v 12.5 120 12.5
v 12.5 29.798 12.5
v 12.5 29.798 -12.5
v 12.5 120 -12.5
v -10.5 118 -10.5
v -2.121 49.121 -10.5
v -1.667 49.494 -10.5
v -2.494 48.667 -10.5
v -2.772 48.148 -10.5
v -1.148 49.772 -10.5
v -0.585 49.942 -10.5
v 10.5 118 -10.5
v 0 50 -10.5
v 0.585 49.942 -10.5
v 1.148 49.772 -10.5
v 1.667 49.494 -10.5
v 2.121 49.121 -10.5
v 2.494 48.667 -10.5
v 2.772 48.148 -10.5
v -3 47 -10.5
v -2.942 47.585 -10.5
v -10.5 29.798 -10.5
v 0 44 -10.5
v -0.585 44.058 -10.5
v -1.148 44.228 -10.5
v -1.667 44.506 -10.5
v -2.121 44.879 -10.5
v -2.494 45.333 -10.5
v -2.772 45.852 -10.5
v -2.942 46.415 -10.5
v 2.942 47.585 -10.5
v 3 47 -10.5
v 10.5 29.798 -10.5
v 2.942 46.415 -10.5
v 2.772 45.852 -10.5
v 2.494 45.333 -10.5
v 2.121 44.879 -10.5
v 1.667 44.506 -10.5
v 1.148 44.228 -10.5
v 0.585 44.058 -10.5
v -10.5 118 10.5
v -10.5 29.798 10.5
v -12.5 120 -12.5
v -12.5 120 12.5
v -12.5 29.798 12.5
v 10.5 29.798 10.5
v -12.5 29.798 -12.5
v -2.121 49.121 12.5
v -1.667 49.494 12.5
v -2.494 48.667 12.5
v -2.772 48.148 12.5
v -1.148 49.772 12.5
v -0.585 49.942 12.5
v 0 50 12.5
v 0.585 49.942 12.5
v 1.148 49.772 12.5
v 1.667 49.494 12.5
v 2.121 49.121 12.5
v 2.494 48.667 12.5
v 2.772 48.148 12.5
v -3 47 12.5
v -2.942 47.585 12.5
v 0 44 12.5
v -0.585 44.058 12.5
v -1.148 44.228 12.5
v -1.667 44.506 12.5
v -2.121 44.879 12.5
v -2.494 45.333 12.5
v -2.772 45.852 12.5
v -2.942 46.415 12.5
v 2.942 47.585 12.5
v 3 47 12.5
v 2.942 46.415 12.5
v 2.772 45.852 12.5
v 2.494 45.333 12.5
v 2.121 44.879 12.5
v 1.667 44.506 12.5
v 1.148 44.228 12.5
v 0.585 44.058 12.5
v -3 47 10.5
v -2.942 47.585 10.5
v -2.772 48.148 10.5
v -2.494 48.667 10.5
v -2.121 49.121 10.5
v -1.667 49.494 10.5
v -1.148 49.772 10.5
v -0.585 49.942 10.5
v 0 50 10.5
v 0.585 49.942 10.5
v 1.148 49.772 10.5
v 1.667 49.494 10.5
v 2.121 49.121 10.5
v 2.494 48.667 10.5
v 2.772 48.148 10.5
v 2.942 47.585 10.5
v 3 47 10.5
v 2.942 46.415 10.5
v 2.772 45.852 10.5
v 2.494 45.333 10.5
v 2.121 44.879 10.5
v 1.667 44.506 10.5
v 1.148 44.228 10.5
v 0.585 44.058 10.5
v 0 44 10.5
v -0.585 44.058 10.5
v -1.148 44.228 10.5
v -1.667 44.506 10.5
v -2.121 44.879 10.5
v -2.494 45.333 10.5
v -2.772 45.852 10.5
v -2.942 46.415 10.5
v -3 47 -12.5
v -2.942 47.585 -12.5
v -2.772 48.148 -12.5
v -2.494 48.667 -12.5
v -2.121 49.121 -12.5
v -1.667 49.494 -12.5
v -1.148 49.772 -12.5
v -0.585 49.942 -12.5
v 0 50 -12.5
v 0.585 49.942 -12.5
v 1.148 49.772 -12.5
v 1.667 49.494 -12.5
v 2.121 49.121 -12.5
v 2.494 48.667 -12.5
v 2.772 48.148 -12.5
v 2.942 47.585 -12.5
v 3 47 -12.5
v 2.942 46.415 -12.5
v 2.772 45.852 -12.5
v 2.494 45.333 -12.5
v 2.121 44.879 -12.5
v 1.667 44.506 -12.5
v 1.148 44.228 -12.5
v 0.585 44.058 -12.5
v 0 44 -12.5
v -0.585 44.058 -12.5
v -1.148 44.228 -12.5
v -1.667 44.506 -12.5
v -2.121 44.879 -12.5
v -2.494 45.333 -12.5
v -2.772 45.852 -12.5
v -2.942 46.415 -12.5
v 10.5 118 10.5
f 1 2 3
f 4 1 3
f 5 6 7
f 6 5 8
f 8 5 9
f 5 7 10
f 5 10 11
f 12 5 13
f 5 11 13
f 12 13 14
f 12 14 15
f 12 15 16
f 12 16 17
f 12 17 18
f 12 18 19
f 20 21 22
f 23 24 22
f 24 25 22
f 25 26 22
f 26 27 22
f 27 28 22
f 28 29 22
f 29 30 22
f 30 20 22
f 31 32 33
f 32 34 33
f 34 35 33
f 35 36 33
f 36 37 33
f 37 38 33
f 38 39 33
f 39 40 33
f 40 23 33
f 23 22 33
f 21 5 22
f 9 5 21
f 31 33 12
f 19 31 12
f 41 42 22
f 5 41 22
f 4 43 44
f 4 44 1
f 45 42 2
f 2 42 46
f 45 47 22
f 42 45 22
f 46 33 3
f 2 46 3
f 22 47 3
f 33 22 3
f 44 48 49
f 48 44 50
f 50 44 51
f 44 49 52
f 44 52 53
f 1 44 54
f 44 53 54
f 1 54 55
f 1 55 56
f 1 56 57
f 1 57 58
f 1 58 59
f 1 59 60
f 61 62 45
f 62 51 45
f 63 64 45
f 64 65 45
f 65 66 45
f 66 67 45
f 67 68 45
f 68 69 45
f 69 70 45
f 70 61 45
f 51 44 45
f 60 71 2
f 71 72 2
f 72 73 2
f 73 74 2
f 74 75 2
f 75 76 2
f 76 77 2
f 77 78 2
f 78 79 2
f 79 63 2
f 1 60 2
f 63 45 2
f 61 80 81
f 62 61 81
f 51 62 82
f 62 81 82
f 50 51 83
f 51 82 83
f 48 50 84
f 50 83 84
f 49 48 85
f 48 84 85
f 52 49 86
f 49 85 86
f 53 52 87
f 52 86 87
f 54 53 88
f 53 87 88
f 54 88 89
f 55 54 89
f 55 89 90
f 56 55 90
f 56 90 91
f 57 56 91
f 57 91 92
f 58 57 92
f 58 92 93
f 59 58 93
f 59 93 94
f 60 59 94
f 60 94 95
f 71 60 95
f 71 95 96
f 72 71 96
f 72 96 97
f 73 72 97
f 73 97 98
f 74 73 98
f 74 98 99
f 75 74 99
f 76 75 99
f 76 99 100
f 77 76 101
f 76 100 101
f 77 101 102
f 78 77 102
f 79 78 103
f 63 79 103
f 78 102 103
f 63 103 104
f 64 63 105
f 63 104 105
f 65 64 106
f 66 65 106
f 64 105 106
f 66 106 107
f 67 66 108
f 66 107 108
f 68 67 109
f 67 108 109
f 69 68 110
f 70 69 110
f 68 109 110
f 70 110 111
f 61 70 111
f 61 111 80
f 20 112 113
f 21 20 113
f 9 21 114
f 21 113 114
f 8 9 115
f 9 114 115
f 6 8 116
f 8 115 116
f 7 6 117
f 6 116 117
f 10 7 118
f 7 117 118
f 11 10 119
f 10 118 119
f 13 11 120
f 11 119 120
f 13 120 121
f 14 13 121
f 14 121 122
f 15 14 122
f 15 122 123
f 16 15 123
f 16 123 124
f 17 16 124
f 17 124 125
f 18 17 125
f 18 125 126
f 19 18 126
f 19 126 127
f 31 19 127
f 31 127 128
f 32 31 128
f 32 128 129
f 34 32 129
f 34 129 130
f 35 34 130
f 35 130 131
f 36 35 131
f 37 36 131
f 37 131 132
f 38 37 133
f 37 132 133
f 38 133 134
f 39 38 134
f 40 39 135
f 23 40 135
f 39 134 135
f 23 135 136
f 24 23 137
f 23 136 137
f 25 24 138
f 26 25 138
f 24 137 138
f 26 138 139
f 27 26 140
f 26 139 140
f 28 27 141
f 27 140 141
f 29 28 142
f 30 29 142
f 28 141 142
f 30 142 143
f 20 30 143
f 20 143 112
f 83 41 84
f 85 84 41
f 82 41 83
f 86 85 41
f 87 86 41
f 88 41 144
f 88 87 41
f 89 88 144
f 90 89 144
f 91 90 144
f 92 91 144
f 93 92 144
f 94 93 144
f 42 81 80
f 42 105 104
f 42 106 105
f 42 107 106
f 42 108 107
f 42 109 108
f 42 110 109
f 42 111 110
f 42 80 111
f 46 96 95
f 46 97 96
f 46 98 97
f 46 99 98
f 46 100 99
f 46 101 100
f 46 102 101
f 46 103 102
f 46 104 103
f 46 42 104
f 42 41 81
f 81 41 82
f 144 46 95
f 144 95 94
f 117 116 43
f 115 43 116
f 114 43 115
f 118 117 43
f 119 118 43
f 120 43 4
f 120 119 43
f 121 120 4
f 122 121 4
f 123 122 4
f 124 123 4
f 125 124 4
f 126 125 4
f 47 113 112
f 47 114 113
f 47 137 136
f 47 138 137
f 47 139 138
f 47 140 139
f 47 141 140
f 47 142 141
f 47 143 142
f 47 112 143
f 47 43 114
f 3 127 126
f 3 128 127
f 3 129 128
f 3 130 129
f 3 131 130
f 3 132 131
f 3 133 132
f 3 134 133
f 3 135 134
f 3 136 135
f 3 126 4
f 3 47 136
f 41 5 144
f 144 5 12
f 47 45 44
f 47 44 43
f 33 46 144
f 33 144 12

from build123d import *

# Parameters (mm, degrees)
SKETCH1_W                = 25.000000038
SKETCH1_H                = 25.000000038
BOSS_EXTRUDE1_DEPTH      = 120
SHELL1_T                 = -2
F_6_0_6_DIAMETER_HOLE1_D = 6
SKETCH6_W                = 35.234136461
SKETCH6_H                = 40.928418781
CUT_EXTRUDE1_DEPTH       = 48.26
CUT_EXTRUDE2_DEPTH       = 48.26
CUT_EXTRUDE2_DEPTH_BACK  = 48.26
SKETCH6_2_W              = 35.234136461
SKETCH6_2_H              = 40.928418781


with BuildPart() as part:
    # Sketch1 → Boss-Extrude1 (new body)
    with BuildSketch(Plane(origin=(0, 0, 0), x_dir=(1, 0, 0), z_dir=(0, 1, 0))):
        Rectangle(SKETCH1_W, SKETCH1_H)
    extrude(amount=BOSS_EXTRUDE1_DEPTH)

    # Shell1
    shell1_openings = [part.faces().sort_by_distance(p)[0] for p in [
        (0, 0, 0),
    ]]
    offset(amount=SHELL1_T, openings=shell1_openings, kind=Kind.INTERSECTION)

    # Ø6.0 (6) Diameter Hole1 (through all)
    with Locations(Plane.XY.offset(12.500000019)):
        with Locations((0, 46.99999998)):
            Hole(F_6_0_6_DIAMETER_HOLE1_D / 2)

    # Sketch6 → Cut-Extrude1 (cut)
    with BuildSketch(Plane.XY):
        with Locations((1.431161847, 9.333336088)):
            Rectangle(SKETCH6_W, SKETCH6_H)
    extrude(amount=-CUT_EXTRUDE1_DEPTH, mode=Mode.SUBTRACT)

    # Sketch6<2> → Cut-Extrude2 (cut, two sides: drawn at the far end of the back side and taken through both)
    with BuildSketch(Plane.XY.offset(-CUT_EXTRUDE2_DEPTH_BACK)):
        with Locations((1.431161847, 9.333336088)):
            Rectangle(SKETCH6_2_W, SKETCH6_2_H)
    extrude(amount=CUT_EXTRUDE2_DEPTH + CUT_EXTRUDE2_DEPTH_BACK, mode=Mode.SUBTRACT)


solid = part.part
